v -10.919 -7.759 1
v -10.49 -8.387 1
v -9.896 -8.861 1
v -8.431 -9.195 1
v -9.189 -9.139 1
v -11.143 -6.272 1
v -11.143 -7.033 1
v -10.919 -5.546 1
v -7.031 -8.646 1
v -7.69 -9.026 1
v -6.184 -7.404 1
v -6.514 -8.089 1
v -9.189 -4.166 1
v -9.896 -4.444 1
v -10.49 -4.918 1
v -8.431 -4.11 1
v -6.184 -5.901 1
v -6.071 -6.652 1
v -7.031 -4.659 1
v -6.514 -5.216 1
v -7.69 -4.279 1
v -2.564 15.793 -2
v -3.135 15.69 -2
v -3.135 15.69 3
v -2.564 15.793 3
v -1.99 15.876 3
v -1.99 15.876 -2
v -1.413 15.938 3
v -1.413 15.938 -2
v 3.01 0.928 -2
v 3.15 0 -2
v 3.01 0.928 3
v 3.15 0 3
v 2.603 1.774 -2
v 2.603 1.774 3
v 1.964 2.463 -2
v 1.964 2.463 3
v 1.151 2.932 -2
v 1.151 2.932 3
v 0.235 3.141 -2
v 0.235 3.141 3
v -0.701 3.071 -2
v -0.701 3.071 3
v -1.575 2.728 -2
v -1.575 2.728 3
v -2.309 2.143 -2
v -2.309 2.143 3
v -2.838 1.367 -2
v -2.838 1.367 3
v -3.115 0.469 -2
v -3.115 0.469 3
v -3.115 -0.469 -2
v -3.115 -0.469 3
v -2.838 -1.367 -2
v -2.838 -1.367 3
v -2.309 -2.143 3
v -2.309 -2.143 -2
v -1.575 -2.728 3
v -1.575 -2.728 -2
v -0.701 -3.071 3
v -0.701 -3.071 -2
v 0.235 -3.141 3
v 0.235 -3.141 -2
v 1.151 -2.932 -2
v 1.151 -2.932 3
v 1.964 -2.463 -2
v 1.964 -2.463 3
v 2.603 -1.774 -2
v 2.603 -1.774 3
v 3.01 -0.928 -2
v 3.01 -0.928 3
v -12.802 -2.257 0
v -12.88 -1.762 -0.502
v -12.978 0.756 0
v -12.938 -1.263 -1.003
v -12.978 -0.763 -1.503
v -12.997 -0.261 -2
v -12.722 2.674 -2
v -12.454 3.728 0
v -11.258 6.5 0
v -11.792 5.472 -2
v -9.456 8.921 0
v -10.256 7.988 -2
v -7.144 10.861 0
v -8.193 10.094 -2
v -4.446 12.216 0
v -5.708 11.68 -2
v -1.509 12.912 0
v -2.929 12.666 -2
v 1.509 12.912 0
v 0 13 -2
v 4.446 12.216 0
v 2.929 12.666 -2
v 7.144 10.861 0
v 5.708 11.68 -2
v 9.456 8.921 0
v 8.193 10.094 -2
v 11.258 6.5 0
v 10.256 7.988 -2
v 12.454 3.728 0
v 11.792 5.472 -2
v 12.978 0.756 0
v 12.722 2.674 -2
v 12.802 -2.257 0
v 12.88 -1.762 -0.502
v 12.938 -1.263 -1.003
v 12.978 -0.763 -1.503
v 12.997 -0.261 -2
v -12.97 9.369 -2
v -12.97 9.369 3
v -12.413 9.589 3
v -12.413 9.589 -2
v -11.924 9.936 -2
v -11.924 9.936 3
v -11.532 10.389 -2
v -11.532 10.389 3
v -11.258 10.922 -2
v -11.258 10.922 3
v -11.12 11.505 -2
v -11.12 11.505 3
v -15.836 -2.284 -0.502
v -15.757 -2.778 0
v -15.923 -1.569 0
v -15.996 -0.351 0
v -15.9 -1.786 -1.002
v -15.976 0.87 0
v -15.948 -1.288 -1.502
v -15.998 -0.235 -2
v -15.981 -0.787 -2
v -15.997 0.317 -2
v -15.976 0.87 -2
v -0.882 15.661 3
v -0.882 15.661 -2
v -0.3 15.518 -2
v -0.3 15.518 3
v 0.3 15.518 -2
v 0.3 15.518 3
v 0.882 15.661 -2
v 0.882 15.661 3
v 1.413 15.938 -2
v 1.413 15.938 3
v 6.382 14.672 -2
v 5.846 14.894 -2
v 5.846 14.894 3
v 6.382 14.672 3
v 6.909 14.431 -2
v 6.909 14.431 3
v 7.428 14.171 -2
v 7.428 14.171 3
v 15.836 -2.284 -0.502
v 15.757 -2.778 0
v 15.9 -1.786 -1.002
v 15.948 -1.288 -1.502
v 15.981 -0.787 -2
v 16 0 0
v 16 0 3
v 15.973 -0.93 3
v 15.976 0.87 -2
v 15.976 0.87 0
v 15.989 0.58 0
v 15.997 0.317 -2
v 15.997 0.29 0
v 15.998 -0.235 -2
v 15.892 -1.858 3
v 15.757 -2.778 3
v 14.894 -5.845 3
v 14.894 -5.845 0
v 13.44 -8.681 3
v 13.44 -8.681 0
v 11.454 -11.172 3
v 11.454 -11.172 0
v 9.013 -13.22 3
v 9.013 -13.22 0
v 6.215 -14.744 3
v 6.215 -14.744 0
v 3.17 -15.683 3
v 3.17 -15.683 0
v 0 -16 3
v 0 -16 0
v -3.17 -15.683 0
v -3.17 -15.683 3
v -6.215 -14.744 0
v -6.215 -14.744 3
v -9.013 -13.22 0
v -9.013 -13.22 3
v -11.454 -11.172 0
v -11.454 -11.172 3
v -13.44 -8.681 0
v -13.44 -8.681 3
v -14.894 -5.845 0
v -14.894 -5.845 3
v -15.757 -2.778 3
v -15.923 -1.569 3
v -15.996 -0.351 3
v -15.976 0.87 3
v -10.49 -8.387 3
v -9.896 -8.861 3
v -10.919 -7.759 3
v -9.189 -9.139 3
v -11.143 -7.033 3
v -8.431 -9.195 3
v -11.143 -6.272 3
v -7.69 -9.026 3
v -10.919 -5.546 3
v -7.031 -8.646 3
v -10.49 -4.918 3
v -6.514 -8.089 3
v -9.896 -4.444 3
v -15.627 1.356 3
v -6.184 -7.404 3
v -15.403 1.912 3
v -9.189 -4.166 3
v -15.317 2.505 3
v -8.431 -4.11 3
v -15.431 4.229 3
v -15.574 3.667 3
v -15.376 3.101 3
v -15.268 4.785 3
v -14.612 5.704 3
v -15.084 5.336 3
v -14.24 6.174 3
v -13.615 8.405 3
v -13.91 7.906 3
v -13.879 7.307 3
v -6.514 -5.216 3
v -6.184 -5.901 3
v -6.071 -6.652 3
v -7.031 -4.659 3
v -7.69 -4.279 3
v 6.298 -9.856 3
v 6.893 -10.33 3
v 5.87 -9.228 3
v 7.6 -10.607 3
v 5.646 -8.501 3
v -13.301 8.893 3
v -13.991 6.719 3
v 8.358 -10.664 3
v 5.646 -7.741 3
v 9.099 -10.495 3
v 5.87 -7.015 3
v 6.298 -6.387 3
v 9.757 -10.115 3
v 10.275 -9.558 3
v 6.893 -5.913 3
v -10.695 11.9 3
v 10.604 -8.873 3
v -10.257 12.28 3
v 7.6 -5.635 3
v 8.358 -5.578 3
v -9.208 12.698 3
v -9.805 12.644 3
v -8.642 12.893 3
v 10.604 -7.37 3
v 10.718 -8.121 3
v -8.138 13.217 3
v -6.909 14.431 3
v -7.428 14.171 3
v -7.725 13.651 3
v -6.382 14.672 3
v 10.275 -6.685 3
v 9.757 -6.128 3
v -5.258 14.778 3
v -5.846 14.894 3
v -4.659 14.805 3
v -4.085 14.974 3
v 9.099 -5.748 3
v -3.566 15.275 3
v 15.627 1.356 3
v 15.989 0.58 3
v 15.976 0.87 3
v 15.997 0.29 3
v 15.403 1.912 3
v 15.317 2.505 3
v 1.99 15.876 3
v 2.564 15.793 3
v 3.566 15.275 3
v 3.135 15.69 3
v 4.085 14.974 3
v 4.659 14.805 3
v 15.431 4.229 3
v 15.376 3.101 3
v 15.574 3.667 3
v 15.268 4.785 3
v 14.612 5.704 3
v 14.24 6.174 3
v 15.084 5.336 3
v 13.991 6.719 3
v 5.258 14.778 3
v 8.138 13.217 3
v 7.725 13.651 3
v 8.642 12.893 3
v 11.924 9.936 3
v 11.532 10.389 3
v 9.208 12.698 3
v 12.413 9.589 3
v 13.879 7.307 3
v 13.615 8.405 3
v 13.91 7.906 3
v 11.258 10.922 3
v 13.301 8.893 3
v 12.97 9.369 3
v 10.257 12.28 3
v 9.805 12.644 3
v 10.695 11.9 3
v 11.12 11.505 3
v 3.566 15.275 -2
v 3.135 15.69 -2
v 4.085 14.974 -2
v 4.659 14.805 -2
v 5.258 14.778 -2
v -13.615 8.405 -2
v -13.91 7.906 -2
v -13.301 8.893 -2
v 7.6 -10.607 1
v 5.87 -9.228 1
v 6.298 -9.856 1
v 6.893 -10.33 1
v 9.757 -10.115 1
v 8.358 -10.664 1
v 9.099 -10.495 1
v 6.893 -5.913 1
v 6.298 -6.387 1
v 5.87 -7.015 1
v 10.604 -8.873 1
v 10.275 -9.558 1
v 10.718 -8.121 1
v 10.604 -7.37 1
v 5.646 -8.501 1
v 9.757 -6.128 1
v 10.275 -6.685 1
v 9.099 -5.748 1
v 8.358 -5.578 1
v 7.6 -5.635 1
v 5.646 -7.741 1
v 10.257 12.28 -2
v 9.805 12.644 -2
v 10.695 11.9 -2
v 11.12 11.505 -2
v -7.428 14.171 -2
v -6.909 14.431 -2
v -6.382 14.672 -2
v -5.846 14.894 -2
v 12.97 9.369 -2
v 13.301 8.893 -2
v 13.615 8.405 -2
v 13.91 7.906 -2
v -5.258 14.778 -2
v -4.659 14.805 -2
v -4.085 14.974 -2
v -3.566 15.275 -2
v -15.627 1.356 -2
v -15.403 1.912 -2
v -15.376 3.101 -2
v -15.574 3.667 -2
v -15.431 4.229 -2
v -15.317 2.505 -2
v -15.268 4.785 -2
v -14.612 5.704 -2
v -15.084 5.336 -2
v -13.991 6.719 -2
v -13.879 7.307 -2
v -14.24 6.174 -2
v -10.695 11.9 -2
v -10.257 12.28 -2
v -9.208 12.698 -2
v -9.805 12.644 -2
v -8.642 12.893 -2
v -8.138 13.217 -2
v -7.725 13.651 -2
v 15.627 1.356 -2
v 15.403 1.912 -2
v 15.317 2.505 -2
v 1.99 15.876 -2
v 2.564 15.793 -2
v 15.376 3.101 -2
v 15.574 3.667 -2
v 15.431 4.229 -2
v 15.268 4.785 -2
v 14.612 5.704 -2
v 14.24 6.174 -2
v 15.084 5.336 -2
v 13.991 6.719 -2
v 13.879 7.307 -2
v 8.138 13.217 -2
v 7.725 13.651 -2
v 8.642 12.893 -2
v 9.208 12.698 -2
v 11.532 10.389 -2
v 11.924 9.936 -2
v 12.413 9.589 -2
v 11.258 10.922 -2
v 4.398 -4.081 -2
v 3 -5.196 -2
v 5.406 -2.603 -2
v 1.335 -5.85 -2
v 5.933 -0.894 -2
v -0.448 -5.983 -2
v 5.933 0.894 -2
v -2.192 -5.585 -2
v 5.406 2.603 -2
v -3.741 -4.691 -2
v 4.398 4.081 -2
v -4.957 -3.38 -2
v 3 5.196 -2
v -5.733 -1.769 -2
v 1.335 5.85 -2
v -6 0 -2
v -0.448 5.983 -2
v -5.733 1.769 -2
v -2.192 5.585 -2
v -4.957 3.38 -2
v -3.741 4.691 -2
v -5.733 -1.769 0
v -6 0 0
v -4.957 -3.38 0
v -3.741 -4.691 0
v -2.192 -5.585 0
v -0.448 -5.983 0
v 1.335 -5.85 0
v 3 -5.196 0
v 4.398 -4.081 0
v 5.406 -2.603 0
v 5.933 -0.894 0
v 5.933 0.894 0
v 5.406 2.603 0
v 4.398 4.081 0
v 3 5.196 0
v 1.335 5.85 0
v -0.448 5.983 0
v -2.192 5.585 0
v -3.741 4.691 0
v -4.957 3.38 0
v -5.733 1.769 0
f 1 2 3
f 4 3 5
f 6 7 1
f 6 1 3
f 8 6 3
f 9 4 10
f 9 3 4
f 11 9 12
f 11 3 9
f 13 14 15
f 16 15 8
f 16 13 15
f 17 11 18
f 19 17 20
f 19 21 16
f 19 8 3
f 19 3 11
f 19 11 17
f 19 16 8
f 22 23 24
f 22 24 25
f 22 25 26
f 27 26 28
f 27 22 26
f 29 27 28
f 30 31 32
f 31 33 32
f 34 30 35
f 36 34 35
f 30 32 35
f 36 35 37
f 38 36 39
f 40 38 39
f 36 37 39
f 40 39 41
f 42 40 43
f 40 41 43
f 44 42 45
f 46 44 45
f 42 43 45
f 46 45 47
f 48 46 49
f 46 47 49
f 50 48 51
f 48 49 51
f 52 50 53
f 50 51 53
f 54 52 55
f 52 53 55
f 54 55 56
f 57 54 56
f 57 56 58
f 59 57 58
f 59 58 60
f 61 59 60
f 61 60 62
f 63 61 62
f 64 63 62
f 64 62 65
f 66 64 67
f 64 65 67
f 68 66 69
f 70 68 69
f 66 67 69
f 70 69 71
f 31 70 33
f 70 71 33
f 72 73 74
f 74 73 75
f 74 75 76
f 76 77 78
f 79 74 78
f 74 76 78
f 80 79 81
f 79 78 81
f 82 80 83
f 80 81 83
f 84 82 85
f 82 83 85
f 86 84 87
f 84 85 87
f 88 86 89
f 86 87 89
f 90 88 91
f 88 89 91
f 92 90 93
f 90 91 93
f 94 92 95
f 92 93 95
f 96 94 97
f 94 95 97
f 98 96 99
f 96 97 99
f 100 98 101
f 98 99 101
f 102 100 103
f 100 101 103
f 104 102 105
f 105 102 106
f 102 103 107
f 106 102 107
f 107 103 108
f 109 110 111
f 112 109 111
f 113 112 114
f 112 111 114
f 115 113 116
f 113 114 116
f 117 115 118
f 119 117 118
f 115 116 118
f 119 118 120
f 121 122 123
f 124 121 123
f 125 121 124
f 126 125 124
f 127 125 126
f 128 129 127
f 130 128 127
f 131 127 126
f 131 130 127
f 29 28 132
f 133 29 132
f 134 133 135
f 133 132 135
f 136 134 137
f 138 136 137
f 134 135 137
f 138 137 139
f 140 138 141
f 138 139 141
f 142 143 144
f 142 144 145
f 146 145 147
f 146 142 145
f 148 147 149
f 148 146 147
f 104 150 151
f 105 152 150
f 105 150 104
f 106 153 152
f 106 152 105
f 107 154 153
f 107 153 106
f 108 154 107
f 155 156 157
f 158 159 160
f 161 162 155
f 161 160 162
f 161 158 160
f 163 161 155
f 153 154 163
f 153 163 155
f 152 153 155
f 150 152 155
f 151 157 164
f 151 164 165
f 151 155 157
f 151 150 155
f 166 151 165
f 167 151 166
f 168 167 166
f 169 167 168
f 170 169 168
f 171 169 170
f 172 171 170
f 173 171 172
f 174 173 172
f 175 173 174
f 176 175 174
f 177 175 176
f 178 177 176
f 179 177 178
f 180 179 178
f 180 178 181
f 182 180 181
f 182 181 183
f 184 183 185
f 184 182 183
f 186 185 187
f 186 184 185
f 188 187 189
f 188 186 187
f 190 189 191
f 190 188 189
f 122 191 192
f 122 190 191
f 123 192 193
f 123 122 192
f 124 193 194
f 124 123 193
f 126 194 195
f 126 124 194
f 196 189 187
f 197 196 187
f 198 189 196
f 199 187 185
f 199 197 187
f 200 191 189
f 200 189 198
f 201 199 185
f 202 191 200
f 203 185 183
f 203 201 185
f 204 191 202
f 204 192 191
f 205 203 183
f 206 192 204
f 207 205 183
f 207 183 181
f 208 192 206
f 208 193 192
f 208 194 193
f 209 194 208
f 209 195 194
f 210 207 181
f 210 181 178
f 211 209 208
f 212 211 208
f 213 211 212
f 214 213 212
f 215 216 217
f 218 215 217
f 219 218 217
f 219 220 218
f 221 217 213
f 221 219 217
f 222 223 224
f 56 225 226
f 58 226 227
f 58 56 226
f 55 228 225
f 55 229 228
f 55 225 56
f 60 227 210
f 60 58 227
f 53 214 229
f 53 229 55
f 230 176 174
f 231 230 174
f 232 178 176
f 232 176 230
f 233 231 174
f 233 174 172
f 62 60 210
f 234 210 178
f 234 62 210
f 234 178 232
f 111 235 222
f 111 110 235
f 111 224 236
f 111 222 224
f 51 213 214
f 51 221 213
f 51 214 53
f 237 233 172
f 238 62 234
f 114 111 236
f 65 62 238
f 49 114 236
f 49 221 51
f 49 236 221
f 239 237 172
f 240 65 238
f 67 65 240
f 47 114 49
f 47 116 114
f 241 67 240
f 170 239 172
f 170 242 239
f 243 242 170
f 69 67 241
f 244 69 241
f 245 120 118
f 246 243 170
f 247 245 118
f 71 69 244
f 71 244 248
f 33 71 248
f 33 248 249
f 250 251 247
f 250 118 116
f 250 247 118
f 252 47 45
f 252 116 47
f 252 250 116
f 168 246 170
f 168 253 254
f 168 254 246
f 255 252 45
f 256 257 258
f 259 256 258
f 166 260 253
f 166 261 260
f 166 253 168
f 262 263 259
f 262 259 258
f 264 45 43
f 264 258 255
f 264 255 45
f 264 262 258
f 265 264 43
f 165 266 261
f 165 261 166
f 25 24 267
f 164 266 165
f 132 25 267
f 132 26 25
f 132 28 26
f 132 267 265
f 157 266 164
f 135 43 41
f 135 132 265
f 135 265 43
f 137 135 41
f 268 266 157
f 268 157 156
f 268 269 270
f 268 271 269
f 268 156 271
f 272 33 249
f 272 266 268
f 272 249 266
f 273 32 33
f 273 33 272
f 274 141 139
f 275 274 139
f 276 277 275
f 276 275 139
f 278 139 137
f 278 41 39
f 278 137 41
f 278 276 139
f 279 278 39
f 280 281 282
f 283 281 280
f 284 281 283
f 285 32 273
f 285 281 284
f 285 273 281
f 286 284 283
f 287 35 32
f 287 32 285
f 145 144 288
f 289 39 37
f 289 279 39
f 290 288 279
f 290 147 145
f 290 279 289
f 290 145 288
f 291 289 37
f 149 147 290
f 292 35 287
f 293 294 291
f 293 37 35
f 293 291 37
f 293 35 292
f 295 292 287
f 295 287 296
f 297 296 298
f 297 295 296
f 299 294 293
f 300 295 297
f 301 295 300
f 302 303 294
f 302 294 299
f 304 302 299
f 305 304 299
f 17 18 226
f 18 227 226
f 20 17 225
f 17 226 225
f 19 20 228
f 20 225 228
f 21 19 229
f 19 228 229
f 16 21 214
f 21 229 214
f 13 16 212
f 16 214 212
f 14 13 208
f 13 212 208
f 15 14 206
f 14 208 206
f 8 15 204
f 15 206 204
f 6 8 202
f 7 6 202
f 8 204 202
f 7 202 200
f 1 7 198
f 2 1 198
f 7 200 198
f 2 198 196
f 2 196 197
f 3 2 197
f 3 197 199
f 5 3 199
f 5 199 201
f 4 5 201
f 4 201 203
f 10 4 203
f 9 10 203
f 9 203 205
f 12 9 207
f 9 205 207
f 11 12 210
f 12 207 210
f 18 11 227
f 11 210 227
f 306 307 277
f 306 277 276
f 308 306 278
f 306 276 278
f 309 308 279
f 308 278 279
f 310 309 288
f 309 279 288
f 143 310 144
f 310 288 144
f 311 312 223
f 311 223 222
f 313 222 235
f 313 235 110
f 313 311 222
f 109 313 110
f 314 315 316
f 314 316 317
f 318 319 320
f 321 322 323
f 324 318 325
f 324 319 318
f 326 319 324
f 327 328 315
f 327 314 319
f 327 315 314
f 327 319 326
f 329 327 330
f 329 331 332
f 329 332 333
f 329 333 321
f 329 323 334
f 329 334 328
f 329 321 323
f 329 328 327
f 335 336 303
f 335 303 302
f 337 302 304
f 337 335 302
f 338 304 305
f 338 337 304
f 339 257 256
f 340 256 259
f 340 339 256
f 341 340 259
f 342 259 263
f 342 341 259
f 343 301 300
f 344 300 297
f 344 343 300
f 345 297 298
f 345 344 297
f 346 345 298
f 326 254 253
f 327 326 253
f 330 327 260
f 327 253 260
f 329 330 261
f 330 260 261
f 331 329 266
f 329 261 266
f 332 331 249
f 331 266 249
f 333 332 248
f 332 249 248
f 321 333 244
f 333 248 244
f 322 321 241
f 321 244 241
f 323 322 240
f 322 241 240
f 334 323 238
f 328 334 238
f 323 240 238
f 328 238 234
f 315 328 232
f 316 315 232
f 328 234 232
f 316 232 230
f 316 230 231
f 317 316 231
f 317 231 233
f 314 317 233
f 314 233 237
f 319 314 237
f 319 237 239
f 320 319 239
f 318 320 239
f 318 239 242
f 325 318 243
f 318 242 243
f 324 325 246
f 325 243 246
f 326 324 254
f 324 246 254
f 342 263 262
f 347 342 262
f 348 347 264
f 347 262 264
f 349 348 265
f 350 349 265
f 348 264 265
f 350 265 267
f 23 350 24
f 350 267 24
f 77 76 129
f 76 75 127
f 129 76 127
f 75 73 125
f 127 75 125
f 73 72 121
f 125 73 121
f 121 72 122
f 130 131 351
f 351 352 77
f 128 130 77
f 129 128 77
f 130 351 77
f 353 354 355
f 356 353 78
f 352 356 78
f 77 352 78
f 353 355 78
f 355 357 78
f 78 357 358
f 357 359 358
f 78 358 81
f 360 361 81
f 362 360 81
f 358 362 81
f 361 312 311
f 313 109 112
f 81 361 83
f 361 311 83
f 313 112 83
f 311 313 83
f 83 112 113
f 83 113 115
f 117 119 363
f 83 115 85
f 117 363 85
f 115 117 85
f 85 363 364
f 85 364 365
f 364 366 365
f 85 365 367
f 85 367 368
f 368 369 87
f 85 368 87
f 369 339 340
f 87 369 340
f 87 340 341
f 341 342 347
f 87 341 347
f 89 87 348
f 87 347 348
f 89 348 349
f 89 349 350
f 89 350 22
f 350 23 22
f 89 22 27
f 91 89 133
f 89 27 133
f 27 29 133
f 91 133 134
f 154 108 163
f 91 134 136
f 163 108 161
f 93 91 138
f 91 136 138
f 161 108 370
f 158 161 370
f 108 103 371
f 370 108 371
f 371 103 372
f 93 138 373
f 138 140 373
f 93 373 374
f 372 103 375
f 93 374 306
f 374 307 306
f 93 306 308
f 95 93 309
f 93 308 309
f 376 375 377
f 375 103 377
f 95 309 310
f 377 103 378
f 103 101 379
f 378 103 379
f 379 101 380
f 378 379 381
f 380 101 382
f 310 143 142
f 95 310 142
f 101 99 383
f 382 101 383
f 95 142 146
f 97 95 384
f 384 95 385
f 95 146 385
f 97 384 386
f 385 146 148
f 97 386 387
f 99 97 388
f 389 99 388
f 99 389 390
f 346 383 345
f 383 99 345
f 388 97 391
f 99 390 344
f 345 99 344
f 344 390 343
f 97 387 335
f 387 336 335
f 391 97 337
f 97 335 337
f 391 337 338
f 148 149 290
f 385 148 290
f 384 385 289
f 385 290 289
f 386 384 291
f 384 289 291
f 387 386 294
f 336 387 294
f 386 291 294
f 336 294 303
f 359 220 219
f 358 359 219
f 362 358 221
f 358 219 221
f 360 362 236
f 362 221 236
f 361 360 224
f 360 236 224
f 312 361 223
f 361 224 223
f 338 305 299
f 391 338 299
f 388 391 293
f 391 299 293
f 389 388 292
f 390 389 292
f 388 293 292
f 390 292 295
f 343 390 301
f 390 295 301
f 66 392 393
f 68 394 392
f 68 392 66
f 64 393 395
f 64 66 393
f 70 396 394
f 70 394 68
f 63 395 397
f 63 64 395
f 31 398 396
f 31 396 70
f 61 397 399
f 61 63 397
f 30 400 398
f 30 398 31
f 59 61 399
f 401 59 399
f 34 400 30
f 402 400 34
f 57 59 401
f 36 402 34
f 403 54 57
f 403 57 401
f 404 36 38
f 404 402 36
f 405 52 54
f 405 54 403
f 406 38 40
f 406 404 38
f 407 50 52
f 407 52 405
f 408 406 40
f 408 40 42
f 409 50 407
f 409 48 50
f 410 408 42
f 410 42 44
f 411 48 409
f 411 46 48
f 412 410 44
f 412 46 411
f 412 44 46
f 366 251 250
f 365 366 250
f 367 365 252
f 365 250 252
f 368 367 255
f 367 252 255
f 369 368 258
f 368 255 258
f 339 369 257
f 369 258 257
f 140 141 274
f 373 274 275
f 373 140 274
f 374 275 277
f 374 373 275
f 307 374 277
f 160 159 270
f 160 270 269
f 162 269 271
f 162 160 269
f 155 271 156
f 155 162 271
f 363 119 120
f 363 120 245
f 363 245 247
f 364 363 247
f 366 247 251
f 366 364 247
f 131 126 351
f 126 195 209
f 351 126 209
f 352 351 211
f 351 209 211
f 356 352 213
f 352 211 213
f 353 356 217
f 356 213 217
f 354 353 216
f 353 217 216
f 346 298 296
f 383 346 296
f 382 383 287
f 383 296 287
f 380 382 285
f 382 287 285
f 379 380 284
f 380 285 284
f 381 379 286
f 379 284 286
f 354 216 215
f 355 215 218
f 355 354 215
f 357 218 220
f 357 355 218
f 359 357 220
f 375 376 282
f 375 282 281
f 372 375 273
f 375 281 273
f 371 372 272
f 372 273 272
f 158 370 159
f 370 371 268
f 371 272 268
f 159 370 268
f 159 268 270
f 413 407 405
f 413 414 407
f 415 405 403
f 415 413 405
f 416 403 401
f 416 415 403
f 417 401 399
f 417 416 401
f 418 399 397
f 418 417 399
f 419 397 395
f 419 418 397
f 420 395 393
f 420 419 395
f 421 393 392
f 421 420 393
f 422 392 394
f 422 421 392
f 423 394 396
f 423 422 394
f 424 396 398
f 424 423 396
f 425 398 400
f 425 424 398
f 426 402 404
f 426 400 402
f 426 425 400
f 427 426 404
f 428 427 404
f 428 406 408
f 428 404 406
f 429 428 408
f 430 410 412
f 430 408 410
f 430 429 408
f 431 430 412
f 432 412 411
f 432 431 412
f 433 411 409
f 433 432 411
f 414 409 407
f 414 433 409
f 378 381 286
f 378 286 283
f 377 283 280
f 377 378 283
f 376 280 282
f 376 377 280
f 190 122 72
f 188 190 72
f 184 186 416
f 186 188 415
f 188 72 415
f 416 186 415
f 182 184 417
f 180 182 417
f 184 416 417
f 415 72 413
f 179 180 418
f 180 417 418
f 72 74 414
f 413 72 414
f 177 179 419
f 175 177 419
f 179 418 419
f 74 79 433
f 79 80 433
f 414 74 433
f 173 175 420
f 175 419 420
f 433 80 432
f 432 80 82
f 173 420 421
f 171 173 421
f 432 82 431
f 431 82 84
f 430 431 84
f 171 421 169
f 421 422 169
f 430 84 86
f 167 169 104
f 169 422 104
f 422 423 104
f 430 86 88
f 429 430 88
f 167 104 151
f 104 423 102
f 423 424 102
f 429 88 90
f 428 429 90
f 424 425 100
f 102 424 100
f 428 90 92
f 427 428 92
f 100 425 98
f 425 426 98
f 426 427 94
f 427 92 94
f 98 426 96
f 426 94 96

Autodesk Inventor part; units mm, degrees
ref_plane "YZ Plane" through (0, 0, 0) normal (1, 0, 0) x (0, 1, 0)
ref_plane "XZ Plane" through (0, 0, 0) normal (0, 1, 0) x (-1, 0, 0)
ref_plane "XY Plane" through (0, 0, 0) normal (0, 0, 1) x (1, 0, 0)
sketch "Sketch1" plane through (0, 0, 0) normal (0, 0, 1) x (1, 0, 0)
  circle A0 centre (0, 0) radius 16
  dimension "d0" = 32
extrude "Extrusion1" add sketch "Sketch1" along normal blind 4
sketch "Sketch2" plane through (0, 0, 4) normal (0, 0, 1) x (1, 0, 0)
  circle A0 centre (0, 0) radius 16 projected
  arc A1 (15.7569, -2.7784) -> (-15.7569, -2.7784) centre (0, 0) ccw
  line L0 (0, 0) -> (-15.7569, -2.7784) construction
  line L1 (0, 0) -> (16, 0) construction
  line L2 (0, 0) -> (15.7569, -2.7784) construction
  arc A2 (12.8025, -2.2574) -> (-12.8025, -2.2574) centre (0, 0) ccw
  line L3 (0, 0) -> (-12.8025, -2.2574) construction
  line L4 (0, 0) -> (13, 0) construction
  line L5 (0, 0) -> (12.8025, -2.2574) construction
  line L6 (-12.8025, -2.2574) -> (-15.7569, -2.7784)
  line L7 (12.8025, -2.2574) -> (15.7569, -2.7784)
  dimension "d3" = 170
  dimension "d4" = 160
  dimension "d5" = 13
  dimension "d6" = 170
  dimension "d7" = 160
extrude "Extrusion2" add sketch "Sketch2" along normal blind 2 and the other way blind 6 contours A0 L7 A2 L6 picked at (-14.8428, -1.3464)
sketch "Sketch3" plane through (0, 0, 6) normal (0, 0, 1) x (1, 0, 0)
  arc A0 (15.7569, -2.7784) -> (-15.7569, -2.7784) centre (0, 0) ccw projected
  line L0 (0, 16) -> (0, 18)
  circle A1 centre (0, 18) radius 2.5
  line L1 (-4.5077, 15.3519) -> (-5.0712, 17.2709)
  circle A2 centre (-5.0712, 17.2709) radius 2.5
  line L2 (-8.6503, 13.4601) -> (-9.7315, 15.1426)
  circle A3 centre (-9.7315, 15.1426) radius 2.5
  line L3 (-12.092, 10.4778) -> (-13.6035, 11.7875)
  circle A4 centre (-13.6035, 11.7875) radius 2.5
  line L4 (-14.5541, 6.6466) -> (-16.3734, 7.4775)
  circle A5 centre (-16.3734, 7.4775) radius 2.5
  line L5 (-15.8371, 2.277) -> (-17.8168, 2.5617)
  circle A6 centre (-17.8168, 2.5617) radius 2.5
  line L6 (-15.8371, -2.277) -> (-17.8168, -2.5617)
  circle A7 centre (-17.8168, -2.5617) radius 2.5
  line L7 (-14.5541, -6.6466) -> (-16.3734, -7.4775)
  circle A8 centre (-16.3734, -7.4775) radius 2.5
  line L8 (-12.092, -10.4778) -> (-13.6035, -11.7875)
  circle A9 centre (-13.6035, -11.7875) radius 2.5
  line L9 (-8.6503, -13.4601) -> (-9.7315, -15.1426)
  circle A10 centre (-9.7315, -15.1426) radius 2.5
  line L10 (-4.5077, -15.3519) -> (-5.0712, -17.2709)
  circle A11 centre (-5.0712, -17.2709) radius 2.5
  line L11 (0, -16) -> (0, -18)
  circle A12 centre (0, -18) radius 2.5
  line L12 (4.5077, -15.3519) -> (5.0712, -17.2709)
  circle A13 centre (5.0712, -17.2709) radius 2.5
  line L13 (8.6503, -13.4601) -> (9.7315, -15.1426)
  circle A14 centre (9.7315, -15.1426) radius 2.5
  line L14 (12.092, -10.4778) -> (13.6035, -11.7875)
  circle A15 centre (13.6035, -11.7875) radius 2.5
  line L15 (14.5541, -6.6466) -> (16.3734, -7.4775)
  circle A16 centre (16.3734, -7.4775) radius 2.5
  line L16 (15.8371, -2.277) -> (17.8168, -2.5617)
  circle A17 centre (17.8168, -2.5617) radius 2.5
  line L17 (15.8371, 2.277) -> (17.8168, 2.5617)
  circle A18 centre (17.8168, 2.5617) radius 2.5
  line L18 (14.5541, 6.6466) -> (16.3734, 7.4775)
  circle A19 centre (16.3734, 7.4775) radius 2.5
  line L19 (12.092, 10.4778) -> (13.6035, 11.7875)
  circle A20 centre (13.6035, 11.7875) radius 2.5
  line L20 (8.6503, 13.4601) -> (9.7315, 15.1426)
  circle A21 centre (9.7315, 15.1426) radius 2.5
  line L21 (4.5077, 15.3519) -> (5.0712, 17.2709)
  circle A22 centre (5.0712, 17.2709) radius 2.5
  dimension "d12" = 2
  dimension "d13" = 5
  dimension "d16" = 360
extrude "Extrusion3" cut sketch "Sketch3" against normal blind 9.25 contours A6 A0 | A0 A6 | A5 A0 | A0 A5 | A4 A0 | A0 A4 | A3 A0 | A0 A3 | A2 A0 | A0 A2 | A1 A0 | A0 A1 | A22 A0 | A0 A22 | A21 A0 | A0 A21 | A20 A0 | A0 A20 | A19 A0 | A0 A19 | A18 A0 | A0 A18
sketch "Sketch4" plane through (0, 0, 4) normal (0, 0, 1) x (1, 0, 0)
  circle A0 centre (0, 0) radius 3.05
  dimension "d20" = 6.1
extrude "Extrusion4" cut sketch "Sketch4" along normal blind 9.25 and the other way blind 8.875
chamfer "Chamfer1" distance 2 angle 45 4 edges at (-14.2797, -2.5179, 6) (-14.2797, -2.5179, -2) (14.2797, -2.5179, 6) (14.2797, -2.5179, -2)
sketch "Sketch5" plane through (0, 0, 4) normal (0, 0, 1) x (1, 0, 0)
  line L0 (0, 0) -> (12.557, 3.3646)
  arc A0 (12.9974, -0.2609) -> (-12.9974, -0.2609) centre (0, 0) ccw projected
  line L1 (0, 0) -> (13, 0) construction
  line L2 (0, 0) -> (2.8978, 0.7765)
  circle A1 centre (0, 0) radius 3.05 projected
  line L3 (0, 0) -> (1.4489, 0.3882)
  arc A2 (7.2444, 1.9411) -> (-4.3467, -1.1647) centre (1.4489, 0.3882) ccw
  line L4 (1.4489, 0.3882) -> (7.2444, 1.9411) construction
  line L5 (1.4489, 0.3882) -> (-4.3467, -1.1647) construction
  arc A3 (10.1422, 2.7176) -> (-7.2444, -1.9411) centre (1.4489, 0.3882) ccw
  line L6 (-7.2444, -1.9411) -> (-4.3467, -1.1647)
  line L7 (7.2444, 1.9411) -> (10.1422, 2.7176)
  dimension "d26" = 15
  dimension "d33" = 1.5
  dimension "d34" = 6
  dimension "d35" = 180
  dimension "d36" = 9
extrude "Extrusion5" add sketch "Sketch5" along normal blind 5 contours A2 L6 A3 L0
sketch "Sketch6" plane through (0, 0, 0) normal (0, 0, -1) x (-1, 0, 0)
  circle A0 centre (0, 0) radius 3
  circle A1 centre (0, 0) radius 6
  dimension "d38" = 12
extrude "Extrusion6" add sketch "Sketch6" along normal blind 2
sketch "Sketch7" plane through (0, 0, 4) normal (0, 0, 1) x (1, 0, 0)
  arc A0 (-15.9763, 0.8697) -> (-15.9806, -0.787) centre (0, 0) ccw projected
  arc A1 (15.9806, -0.787) -> (15.9763, 0.8697) centre (0, 0) ccw projected
  arc A2 (-15.9763, 0.8697) -> (15.9806, -0.787) centre (0, 0) ccw
  arc A3 (12.9974, -0.2609) -> (-12.9974, -0.2609) centre (0, 0) ccw projected
  arc A4 (-13, 0) -> (13, 0) centre (0, 0) ccw
  line L0 (0, 0) -> (13, 0) construction
  line L1 (0, 0) -> (-13, 0) construction
  line L2 (-15.9763, 0.8697) -> (-13, 0)
  line L3 (13, 0) -> (15.9763, 0.8697)
  dimension "d41" = 13
  dimension "d42" = 180
extrude "Extrusion7" add sketch "Sketch7" along normal blind 2 contours L2 A3 A4 L3 A1 A2 A0
sketch "Sketch12" plane through (0, 0, 4) normal (0, 0, 1) x (1, 0, 0)
  circle A0 centre (0, 0) radius 13
extrude "Extrusion11" add sketch "Sketch12" along normal blind 2
sketch "Sketch8" plane through (0, 0, 0) normal (0, 0, -1) x (-1, 0, 0)
  arc A0 (-6.62, -8.785) -> (7.502, -8.0449) centre (0, 0) ccw
  line L0 (0, 0) -> (-6.62, -8.785) construction
  line L1 (0, 0) -> (11, 0) construction
  line L2 (0, 0) -> (7.502, -8.0449) construction
  circle A1 centre (-6.62, -8.785) radius 2.5
  circle A2 centre (7.502, -8.0449) radius 2.5
  dimension "d45" = 11
  dimension "d46" = 127
  dimension "d47" = 80
  dimension "d48" = 5
  dimension "d49" = 5
extrude "Extrusion8" [suppressed]
sketch "Sketch13" plane through (0, 0, 6) normal (0, 0, 1) x (1, 0, 0)
  circle A0 centre (0, 0) radius 3.15
  dimension "d72" = 6.3
extrude "Extrusion12" cut sketch "Sketch13" against normal blind 10.25
sketch "Sketch14" plane through (0, 0, 6) normal (0, 0, 1) x (1, 0, 0)
  point P0 (0, 0)
sketch "Sketch15" plane through (0, 0, 6) normal (0, 0, 1) x (1, 0, 0)
  arc A0 (-8.6212, -6.6525) -> (8.1676, -8.1213) centre (0.3894, -0.3431) ccw
  line L0 (0.3894, -0.3431) -> (-8.6212, -6.6525) construction
  line L1 (0.3894, -0.3431) -> (11.3894, -0.3431) construction
  line L2 (0.3894, -0.3431) -> (8.1676, -8.1213) construction
  circle A1 centre (-8.6212, -6.6525) radius 2.55
  circle A2 centre (8.1676, -8.1213) radius 2.55
  point P0 (0, 0)
  dimension "d73" = 11
  dimension "d74" = 145
  dimension "d75" = 100
  dimension "d76" = 5.1
  dimension "d77" = 5.1
extrude "Extrusion13" cut sketch "Sketch15" against normal blind 5
fillet "Fillet6" radius 1.2 4 edges at (-7.2444, -1.9411, 7.5) (-4.3467, -1.1647, 7.5) (7.2444, 1.9411, 7.5) (10.1422, 2.7176, 7.5)
sketch "Sketch16" plane through (-8.6212, -6.6525, 1) normal (0, 0, 1) x (1, 0, 0)
  circle A0 centre (0, 0) radius 1
  circle A1 centre (16.7888, -1.4688) radius 2.55 projected
  circle A2 centre (16.7888, -1.4688) radius 1
  point P0 (8.6212, 6.6525)
  dimension "d84" = 2
  dimension "d85" = 2
extrude "Extrusion14" [suppressed]
sketch "Sketch18" plane through (0, 0, 6) normal (0, 0, 1) x (1, 0, 0)
  arc A0 (-1.4128, 15.9375) -> (-3.1345, 15.69) centre (0, 0) ccw projected
  line L0 (-3.1345, 15.69) -> (-2.0992, 19.5537)
  line L1 (-3.1345, 15.69) -> (0.8655, 15.69) construction
  arc A1 (3.1345, 15.69) -> (1.4128, 15.9375) centre (0, 0) ccw projected
  arc A2 (3.1345, 15.69) -> (5.8457, 14.8939) centre (5.0712, 17.2709) ccw projected
  line L2 (3.1345, 15.69) -> (2.0992, 19.5537)
  line L3 (3.1345, 15.69) -> (7.1345, 15.69) construction
  line L4 (2.0992, 19.5537) -> (-2.0992, 19.5537)
  arc A3 (-5.8457, 14.8939) -> (-3.1345, 15.69) centre (-5.0712, 17.2709) ccw projected
  line L5 (-3.1345, 15.69) -> (0, 14.2283)
  line L6 (-3.1345, 15.69) -> (0.324, 15.69) construction
  line L7 (0, 14.2283) -> (3.1345, 15.69)
  dimension "d94" = 4
  dimension "d95" = 75
  dimension "d96" = 4
  dimension "d97" = 105
  dimension "d98" = 25
extrude "Extrusion16" [suppressed]
fillet "Fillet11" [suppressed]
sketch "Sketch20" plane through (0, 0, 6) normal (0, 0, 1) x (1, 0, 0)
  line L0 (-0.1809, 19.5537) -> (0.1809, 19.5537) projected
  arc A0 (-0.1809, 19.5537) -> (-2.5957, 17.7007) centre (-0.1809, 17.0537) ccw projected
  arc A1 (2.5957, 17.7007) -> (0.1809, 19.5537) centre (0.1809, 17.0537) ccw projected
  line L1 (-2.8685, 16.6827) -> (-2.5957, 17.7007) projected
  line L2 (2.5957, 17.7007) -> (2.8685, 16.6827) projected
  line L3 (-1.1298, 16.2169) -> (-0.8571, 17.2348)
  arc A2 (-0.1809, 17.7537) -> (-0.8571, 17.2348) centre (-0.1809, 17.0537) ccw
  line L4 (-0.1809, 17.7537) -> (0.1809, 17.7537)
  arc A3 (0.8571, 17.2348) -> (0.1809, 17.7537) centre (0.1809, 17.0537) ccw
  line L5 (0.8571, 17.2348) -> (1.1298, 16.2169)
  line L6 (-1.1298, 16.2169) -> (-1.6475, 14.285)
  line L7 (-1.6475, 14.285) -> (1.6475, 14.285)
  line L8 (1.6475, 14.285) -> (1.1298, 16.2169)
  point P0 (0, 0)
  dimension "d112" = 1.8
  dimension "d113" = 2
extrude "Extrusion18" [suppressed]
fillet "Fillet12" [suppressed]
sketch "Sketch21" plane through (0, 0, 9) normal (0, 0, 1) x (1, 0, 0)
  point P0 (0, 0)
ref_plane "Work Plane1" through (0, 0, 3) normal (0, 0, 1) x (1, 0, 0)
sketch "Sketch22" plane through (0, 0, 3) normal (0, 0, 1) x (1, 0, 0)
  circle A0 centre (0, 0) radius 17.3364
extrude "Extrusion19" cut sketch "Sketch22" along normal blind 10
properties part number "knob_bottom"
